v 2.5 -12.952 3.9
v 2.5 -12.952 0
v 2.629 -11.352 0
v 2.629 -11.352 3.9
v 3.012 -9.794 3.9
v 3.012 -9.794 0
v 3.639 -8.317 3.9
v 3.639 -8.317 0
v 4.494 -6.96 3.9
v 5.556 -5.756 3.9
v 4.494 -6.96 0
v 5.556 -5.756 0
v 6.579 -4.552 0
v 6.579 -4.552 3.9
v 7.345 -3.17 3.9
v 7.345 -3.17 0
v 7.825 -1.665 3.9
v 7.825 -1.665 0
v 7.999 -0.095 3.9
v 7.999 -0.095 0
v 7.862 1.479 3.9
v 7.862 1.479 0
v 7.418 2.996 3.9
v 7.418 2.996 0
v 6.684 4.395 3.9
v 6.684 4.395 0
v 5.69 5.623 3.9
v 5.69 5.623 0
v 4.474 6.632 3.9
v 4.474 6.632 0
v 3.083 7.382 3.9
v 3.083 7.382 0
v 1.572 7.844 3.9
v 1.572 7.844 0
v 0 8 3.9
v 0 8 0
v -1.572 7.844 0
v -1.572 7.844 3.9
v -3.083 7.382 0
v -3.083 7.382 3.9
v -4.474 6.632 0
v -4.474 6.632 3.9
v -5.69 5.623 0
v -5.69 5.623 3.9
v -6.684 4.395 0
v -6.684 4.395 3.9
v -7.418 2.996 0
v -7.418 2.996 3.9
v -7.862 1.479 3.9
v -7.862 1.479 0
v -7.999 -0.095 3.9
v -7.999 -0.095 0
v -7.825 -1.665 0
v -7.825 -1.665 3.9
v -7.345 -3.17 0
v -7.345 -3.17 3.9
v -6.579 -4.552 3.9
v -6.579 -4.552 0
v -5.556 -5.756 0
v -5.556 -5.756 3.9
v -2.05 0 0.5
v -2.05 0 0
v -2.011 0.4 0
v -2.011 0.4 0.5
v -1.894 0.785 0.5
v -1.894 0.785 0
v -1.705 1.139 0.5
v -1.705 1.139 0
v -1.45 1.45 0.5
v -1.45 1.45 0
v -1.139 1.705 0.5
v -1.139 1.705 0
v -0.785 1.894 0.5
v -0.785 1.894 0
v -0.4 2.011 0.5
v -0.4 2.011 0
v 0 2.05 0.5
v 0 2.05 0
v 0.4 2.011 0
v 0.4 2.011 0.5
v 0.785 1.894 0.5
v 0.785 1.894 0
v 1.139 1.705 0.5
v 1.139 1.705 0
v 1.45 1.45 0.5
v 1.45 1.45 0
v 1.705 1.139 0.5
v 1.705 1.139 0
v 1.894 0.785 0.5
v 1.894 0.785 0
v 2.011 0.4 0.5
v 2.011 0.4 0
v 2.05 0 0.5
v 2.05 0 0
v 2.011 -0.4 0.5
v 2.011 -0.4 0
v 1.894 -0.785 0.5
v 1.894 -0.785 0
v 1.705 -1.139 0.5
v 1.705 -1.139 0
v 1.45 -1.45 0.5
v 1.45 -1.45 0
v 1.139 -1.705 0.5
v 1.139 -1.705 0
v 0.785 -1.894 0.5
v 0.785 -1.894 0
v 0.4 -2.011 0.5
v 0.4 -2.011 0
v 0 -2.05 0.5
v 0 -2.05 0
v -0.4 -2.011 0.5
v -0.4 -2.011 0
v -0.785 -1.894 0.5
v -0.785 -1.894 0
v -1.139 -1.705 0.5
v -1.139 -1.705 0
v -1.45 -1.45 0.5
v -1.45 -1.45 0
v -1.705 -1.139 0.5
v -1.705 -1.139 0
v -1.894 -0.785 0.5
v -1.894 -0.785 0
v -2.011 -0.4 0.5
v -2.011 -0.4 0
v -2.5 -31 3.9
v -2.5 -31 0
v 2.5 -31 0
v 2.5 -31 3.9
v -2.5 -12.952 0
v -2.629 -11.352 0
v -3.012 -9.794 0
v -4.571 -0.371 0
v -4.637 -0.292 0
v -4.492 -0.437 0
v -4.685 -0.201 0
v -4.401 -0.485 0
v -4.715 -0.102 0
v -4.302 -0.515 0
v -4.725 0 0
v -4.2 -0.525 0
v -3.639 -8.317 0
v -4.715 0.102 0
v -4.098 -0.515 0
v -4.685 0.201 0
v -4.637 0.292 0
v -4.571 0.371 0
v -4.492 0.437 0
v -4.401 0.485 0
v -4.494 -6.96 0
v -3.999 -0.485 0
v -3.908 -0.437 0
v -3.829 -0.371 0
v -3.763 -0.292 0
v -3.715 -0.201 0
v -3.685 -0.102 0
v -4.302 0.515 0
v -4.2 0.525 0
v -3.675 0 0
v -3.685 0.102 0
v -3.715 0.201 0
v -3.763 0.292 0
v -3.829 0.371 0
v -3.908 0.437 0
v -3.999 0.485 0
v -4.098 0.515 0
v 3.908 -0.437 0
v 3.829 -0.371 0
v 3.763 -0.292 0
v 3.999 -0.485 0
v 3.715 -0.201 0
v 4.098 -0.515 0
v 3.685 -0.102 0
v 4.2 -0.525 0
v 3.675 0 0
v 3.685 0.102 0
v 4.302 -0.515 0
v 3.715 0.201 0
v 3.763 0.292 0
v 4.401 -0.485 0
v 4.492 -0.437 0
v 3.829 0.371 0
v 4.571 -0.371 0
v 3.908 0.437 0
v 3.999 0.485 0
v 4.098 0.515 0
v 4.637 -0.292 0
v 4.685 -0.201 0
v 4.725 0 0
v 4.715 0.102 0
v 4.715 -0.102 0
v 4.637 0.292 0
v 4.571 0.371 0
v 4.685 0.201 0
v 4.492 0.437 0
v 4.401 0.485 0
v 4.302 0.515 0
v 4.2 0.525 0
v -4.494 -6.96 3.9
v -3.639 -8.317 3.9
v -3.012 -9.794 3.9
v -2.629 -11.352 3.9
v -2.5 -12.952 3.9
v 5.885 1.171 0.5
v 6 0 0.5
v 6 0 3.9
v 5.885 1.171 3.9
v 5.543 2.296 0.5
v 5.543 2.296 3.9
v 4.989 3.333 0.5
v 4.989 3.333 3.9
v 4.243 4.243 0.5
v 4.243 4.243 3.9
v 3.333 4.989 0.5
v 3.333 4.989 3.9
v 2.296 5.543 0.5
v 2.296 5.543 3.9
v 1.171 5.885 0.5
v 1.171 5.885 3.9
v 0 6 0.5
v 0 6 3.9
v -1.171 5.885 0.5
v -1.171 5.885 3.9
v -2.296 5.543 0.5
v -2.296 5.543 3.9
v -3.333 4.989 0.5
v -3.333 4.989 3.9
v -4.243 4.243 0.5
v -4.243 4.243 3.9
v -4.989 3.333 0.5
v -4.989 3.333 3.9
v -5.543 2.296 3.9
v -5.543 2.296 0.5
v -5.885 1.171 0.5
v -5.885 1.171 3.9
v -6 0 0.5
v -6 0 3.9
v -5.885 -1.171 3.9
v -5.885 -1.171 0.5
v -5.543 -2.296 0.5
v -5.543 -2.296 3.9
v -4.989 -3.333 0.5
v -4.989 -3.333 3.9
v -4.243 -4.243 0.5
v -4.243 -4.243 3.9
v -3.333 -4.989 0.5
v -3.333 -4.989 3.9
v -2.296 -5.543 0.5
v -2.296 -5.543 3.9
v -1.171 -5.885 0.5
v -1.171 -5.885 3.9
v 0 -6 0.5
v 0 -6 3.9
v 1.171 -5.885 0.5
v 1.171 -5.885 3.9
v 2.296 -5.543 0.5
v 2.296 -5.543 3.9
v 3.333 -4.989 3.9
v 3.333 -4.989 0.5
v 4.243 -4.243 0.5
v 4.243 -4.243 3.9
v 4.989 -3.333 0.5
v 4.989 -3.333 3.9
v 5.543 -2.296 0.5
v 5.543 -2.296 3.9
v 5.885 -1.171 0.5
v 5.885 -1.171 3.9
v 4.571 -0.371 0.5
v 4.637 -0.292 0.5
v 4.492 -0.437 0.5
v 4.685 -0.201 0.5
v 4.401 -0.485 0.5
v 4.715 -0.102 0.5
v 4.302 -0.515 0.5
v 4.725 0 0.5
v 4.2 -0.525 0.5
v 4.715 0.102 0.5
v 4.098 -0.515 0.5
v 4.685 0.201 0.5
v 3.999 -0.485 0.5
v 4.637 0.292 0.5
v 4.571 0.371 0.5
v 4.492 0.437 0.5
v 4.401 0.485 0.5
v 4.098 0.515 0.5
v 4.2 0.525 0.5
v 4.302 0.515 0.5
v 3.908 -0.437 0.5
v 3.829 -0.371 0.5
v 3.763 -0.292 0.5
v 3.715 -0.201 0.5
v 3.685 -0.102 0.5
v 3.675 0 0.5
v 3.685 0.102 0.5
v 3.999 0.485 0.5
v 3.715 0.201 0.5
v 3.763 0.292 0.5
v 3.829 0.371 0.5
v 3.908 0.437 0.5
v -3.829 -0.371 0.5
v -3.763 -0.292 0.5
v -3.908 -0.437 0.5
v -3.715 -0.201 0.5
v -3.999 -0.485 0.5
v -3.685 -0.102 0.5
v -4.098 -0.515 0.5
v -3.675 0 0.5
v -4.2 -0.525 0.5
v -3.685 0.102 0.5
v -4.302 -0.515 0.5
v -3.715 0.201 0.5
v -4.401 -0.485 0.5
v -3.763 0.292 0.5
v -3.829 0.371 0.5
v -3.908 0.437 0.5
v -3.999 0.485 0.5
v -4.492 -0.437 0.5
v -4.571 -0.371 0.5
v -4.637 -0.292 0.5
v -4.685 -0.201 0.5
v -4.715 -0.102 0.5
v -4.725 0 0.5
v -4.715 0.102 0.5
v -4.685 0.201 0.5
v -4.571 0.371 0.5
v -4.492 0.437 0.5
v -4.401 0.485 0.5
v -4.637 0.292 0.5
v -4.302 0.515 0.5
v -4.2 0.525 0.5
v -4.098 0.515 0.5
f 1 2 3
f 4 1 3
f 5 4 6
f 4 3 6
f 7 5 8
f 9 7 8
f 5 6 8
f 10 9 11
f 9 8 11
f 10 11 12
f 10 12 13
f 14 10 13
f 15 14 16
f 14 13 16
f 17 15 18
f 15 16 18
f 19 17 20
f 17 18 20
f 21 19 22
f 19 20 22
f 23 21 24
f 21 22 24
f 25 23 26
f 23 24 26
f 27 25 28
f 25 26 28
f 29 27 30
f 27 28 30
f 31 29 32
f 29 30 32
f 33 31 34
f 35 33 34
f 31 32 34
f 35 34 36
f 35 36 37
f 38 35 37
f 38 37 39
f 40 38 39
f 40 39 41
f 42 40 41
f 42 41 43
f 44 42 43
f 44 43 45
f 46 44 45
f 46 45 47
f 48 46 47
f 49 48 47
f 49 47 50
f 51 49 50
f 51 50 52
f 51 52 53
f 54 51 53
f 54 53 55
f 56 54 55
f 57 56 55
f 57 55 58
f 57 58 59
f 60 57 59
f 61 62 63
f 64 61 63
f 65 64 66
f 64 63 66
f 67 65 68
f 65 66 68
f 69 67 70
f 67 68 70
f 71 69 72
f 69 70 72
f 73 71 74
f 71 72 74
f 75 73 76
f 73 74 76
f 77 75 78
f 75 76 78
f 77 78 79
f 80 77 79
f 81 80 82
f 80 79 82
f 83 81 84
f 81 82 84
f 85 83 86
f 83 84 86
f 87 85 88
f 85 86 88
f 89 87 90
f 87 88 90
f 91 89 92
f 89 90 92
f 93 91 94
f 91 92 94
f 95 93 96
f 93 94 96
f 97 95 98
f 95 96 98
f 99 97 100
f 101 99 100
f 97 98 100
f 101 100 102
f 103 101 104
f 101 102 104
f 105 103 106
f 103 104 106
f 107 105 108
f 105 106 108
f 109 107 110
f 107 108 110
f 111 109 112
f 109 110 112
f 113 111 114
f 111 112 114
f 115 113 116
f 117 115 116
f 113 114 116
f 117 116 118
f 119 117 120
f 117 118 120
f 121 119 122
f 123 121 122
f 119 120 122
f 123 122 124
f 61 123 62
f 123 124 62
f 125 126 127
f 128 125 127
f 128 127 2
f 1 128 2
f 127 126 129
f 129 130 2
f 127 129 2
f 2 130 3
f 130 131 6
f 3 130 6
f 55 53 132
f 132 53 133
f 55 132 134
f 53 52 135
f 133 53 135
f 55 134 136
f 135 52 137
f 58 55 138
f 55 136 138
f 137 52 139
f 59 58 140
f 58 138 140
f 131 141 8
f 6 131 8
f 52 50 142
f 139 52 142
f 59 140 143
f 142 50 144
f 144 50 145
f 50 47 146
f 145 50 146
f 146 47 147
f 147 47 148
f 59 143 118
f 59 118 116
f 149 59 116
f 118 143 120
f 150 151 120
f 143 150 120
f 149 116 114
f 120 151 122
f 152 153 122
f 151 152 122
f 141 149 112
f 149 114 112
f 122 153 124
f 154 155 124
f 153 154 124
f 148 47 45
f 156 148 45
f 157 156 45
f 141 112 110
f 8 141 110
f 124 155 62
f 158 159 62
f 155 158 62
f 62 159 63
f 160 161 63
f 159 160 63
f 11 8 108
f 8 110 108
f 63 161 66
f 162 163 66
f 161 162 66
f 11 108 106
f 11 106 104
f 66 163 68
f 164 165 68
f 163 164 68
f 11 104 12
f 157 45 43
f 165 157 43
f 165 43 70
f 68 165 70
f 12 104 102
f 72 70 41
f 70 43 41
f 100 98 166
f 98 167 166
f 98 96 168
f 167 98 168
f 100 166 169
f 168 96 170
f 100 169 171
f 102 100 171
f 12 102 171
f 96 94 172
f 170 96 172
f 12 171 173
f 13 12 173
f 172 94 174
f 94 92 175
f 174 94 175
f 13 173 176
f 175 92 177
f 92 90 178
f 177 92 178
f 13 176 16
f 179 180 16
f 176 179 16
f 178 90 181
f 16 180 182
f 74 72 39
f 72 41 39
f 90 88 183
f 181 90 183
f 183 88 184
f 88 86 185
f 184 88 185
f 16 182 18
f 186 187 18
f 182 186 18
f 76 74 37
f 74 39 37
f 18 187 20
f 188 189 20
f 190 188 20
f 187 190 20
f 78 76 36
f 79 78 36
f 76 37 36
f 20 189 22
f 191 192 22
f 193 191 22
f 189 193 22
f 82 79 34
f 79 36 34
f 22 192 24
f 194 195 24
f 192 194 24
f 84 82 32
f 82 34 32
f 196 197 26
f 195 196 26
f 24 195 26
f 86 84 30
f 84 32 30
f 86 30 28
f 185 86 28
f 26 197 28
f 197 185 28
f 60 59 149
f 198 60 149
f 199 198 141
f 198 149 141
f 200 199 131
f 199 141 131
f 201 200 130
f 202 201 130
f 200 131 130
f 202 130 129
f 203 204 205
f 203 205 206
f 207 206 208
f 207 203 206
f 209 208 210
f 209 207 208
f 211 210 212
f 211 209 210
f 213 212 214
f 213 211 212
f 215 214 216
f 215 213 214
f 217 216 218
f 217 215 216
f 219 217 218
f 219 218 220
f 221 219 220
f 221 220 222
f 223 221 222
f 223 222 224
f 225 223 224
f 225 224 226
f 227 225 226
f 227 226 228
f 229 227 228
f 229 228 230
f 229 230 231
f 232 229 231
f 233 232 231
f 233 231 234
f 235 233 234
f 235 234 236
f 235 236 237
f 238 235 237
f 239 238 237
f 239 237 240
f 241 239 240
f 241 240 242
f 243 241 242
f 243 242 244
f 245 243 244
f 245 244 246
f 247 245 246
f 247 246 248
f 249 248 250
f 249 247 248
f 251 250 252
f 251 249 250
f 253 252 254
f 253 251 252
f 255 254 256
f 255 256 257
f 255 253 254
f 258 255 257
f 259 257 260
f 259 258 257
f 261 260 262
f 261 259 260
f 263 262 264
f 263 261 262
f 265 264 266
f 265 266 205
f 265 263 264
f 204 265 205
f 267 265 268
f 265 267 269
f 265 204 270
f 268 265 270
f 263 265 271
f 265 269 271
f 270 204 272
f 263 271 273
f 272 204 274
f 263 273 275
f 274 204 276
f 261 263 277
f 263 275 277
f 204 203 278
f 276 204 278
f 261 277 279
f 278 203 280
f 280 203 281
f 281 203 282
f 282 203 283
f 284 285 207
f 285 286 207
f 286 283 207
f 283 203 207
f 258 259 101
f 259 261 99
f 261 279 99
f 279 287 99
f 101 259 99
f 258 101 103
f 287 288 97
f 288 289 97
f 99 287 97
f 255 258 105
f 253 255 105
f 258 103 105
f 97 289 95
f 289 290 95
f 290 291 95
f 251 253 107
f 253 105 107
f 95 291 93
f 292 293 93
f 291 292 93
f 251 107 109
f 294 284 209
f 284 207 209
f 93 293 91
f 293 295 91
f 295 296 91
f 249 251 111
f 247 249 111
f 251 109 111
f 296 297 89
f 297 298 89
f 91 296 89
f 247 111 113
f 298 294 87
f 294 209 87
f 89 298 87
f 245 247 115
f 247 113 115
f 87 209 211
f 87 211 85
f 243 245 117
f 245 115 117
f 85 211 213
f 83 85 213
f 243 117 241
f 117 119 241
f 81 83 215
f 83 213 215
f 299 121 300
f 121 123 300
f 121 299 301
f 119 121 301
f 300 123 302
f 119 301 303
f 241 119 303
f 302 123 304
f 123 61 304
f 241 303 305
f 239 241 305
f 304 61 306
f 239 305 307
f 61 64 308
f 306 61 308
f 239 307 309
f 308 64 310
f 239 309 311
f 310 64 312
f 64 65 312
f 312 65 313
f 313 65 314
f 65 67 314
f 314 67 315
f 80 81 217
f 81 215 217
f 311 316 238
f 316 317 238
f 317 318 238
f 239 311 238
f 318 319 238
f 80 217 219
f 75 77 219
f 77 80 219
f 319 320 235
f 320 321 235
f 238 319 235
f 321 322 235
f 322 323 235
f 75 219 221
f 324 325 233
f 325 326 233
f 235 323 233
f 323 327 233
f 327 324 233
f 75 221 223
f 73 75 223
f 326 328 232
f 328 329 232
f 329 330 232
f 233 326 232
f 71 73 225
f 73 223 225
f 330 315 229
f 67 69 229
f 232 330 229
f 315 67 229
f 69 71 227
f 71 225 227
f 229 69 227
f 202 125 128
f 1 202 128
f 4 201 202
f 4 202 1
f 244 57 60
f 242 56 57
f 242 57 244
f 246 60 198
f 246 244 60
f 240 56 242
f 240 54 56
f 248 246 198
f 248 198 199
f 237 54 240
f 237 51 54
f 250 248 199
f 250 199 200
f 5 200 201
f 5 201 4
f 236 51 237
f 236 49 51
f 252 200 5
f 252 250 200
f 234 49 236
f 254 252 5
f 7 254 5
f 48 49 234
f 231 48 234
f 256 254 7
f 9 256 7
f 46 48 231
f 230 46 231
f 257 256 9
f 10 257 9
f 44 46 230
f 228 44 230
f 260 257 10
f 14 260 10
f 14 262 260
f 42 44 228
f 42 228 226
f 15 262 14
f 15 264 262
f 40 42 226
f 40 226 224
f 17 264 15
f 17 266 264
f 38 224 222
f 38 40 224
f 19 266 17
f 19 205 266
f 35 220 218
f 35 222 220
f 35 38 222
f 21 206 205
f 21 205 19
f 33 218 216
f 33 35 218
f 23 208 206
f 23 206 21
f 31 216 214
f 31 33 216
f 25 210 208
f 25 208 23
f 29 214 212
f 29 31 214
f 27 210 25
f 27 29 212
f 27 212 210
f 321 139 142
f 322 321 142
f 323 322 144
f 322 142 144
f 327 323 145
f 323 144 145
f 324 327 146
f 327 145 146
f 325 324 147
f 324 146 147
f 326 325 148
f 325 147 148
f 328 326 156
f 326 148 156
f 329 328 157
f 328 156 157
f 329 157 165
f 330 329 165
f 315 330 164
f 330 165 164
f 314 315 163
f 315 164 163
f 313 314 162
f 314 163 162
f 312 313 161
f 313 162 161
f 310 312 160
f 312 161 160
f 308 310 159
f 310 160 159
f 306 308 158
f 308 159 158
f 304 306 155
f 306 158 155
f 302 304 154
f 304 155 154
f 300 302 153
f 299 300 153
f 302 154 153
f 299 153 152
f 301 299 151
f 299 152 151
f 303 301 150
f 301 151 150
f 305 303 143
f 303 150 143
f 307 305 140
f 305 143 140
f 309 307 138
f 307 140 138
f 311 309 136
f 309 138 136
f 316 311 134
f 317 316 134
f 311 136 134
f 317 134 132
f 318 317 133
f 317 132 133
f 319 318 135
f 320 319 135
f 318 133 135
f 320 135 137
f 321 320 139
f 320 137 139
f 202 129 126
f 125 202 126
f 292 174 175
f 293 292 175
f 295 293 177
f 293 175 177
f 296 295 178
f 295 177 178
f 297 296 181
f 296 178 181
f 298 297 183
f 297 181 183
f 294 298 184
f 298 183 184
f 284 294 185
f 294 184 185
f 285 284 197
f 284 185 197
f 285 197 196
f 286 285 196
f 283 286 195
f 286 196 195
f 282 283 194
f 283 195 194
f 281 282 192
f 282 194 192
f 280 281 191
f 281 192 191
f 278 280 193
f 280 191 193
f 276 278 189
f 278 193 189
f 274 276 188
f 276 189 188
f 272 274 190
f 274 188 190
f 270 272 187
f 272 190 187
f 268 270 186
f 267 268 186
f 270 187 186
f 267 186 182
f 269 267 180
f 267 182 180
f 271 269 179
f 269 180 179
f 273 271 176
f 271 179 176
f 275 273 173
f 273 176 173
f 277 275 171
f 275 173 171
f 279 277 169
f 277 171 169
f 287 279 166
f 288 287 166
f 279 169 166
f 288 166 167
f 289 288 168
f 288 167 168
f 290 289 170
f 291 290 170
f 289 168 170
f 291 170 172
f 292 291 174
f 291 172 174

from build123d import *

# Parameters (mm, degrees)
SKETCH1_R           = 6
BOSS_EXTRUDE1_DEPTH = 3.9
SKETCH5_R           = 8
SKETCH5_R_2         = 2.05
SKETCH5_R_3         = 0.525
BOSS_EXTRUDE3_DEPTH = 0.5


with BuildPart() as part:
    # Sketch1 → Boss-Extrude1 (new body)
    with BuildSketch(Plane.XY):
        with BuildLine():
            Line((-2.5, -31), (2.5, -31))
            Line((2.5, -31), (2.5, -12.951833847))
            ThreePointArc((2.5, -12.951833847), (3.295532486, -9.043154047), (5.555555556, -5.756370599))
            ThreePointArc((5.555555556, -5.756370599), (0, 8), (-5.555555556, -5.756370599))
            ThreePointArc((-5.555555556, -5.756370599), (-3.295532486, -9.043154047), (-2.5, -12.951833847))
            Line((-2.5, -12.951833847), (-2.5, -31))
        make_face()
        Circle(SKETCH1_R, mode=Mode.SUBTRACT)
    extrude(amount=BOSS_EXTRUDE1_DEPTH)

    # Sketch5 → Boss-Extrude3 (add)
    with BuildSketch(Plane(origin=(0, 0, 0), x_dir=(-1, 0, 0), z_dir=(0, 0, -1))):
        Circle(SKETCH5_R)
        Circle(SKETCH5_R_2, mode=Mode.SUBTRACT)
        with Locations((4.2, 0)):
            Circle(SKETCH5_R_3, mode=Mode.SUBTRACT)
        with Locations((-4.2, 0)):
            Circle(SKETCH5_R_3, mode=Mode.SUBTRACT)
    extrude(amount=-BOSS_EXTRUDE3_DEPTH)


solid = part.part
